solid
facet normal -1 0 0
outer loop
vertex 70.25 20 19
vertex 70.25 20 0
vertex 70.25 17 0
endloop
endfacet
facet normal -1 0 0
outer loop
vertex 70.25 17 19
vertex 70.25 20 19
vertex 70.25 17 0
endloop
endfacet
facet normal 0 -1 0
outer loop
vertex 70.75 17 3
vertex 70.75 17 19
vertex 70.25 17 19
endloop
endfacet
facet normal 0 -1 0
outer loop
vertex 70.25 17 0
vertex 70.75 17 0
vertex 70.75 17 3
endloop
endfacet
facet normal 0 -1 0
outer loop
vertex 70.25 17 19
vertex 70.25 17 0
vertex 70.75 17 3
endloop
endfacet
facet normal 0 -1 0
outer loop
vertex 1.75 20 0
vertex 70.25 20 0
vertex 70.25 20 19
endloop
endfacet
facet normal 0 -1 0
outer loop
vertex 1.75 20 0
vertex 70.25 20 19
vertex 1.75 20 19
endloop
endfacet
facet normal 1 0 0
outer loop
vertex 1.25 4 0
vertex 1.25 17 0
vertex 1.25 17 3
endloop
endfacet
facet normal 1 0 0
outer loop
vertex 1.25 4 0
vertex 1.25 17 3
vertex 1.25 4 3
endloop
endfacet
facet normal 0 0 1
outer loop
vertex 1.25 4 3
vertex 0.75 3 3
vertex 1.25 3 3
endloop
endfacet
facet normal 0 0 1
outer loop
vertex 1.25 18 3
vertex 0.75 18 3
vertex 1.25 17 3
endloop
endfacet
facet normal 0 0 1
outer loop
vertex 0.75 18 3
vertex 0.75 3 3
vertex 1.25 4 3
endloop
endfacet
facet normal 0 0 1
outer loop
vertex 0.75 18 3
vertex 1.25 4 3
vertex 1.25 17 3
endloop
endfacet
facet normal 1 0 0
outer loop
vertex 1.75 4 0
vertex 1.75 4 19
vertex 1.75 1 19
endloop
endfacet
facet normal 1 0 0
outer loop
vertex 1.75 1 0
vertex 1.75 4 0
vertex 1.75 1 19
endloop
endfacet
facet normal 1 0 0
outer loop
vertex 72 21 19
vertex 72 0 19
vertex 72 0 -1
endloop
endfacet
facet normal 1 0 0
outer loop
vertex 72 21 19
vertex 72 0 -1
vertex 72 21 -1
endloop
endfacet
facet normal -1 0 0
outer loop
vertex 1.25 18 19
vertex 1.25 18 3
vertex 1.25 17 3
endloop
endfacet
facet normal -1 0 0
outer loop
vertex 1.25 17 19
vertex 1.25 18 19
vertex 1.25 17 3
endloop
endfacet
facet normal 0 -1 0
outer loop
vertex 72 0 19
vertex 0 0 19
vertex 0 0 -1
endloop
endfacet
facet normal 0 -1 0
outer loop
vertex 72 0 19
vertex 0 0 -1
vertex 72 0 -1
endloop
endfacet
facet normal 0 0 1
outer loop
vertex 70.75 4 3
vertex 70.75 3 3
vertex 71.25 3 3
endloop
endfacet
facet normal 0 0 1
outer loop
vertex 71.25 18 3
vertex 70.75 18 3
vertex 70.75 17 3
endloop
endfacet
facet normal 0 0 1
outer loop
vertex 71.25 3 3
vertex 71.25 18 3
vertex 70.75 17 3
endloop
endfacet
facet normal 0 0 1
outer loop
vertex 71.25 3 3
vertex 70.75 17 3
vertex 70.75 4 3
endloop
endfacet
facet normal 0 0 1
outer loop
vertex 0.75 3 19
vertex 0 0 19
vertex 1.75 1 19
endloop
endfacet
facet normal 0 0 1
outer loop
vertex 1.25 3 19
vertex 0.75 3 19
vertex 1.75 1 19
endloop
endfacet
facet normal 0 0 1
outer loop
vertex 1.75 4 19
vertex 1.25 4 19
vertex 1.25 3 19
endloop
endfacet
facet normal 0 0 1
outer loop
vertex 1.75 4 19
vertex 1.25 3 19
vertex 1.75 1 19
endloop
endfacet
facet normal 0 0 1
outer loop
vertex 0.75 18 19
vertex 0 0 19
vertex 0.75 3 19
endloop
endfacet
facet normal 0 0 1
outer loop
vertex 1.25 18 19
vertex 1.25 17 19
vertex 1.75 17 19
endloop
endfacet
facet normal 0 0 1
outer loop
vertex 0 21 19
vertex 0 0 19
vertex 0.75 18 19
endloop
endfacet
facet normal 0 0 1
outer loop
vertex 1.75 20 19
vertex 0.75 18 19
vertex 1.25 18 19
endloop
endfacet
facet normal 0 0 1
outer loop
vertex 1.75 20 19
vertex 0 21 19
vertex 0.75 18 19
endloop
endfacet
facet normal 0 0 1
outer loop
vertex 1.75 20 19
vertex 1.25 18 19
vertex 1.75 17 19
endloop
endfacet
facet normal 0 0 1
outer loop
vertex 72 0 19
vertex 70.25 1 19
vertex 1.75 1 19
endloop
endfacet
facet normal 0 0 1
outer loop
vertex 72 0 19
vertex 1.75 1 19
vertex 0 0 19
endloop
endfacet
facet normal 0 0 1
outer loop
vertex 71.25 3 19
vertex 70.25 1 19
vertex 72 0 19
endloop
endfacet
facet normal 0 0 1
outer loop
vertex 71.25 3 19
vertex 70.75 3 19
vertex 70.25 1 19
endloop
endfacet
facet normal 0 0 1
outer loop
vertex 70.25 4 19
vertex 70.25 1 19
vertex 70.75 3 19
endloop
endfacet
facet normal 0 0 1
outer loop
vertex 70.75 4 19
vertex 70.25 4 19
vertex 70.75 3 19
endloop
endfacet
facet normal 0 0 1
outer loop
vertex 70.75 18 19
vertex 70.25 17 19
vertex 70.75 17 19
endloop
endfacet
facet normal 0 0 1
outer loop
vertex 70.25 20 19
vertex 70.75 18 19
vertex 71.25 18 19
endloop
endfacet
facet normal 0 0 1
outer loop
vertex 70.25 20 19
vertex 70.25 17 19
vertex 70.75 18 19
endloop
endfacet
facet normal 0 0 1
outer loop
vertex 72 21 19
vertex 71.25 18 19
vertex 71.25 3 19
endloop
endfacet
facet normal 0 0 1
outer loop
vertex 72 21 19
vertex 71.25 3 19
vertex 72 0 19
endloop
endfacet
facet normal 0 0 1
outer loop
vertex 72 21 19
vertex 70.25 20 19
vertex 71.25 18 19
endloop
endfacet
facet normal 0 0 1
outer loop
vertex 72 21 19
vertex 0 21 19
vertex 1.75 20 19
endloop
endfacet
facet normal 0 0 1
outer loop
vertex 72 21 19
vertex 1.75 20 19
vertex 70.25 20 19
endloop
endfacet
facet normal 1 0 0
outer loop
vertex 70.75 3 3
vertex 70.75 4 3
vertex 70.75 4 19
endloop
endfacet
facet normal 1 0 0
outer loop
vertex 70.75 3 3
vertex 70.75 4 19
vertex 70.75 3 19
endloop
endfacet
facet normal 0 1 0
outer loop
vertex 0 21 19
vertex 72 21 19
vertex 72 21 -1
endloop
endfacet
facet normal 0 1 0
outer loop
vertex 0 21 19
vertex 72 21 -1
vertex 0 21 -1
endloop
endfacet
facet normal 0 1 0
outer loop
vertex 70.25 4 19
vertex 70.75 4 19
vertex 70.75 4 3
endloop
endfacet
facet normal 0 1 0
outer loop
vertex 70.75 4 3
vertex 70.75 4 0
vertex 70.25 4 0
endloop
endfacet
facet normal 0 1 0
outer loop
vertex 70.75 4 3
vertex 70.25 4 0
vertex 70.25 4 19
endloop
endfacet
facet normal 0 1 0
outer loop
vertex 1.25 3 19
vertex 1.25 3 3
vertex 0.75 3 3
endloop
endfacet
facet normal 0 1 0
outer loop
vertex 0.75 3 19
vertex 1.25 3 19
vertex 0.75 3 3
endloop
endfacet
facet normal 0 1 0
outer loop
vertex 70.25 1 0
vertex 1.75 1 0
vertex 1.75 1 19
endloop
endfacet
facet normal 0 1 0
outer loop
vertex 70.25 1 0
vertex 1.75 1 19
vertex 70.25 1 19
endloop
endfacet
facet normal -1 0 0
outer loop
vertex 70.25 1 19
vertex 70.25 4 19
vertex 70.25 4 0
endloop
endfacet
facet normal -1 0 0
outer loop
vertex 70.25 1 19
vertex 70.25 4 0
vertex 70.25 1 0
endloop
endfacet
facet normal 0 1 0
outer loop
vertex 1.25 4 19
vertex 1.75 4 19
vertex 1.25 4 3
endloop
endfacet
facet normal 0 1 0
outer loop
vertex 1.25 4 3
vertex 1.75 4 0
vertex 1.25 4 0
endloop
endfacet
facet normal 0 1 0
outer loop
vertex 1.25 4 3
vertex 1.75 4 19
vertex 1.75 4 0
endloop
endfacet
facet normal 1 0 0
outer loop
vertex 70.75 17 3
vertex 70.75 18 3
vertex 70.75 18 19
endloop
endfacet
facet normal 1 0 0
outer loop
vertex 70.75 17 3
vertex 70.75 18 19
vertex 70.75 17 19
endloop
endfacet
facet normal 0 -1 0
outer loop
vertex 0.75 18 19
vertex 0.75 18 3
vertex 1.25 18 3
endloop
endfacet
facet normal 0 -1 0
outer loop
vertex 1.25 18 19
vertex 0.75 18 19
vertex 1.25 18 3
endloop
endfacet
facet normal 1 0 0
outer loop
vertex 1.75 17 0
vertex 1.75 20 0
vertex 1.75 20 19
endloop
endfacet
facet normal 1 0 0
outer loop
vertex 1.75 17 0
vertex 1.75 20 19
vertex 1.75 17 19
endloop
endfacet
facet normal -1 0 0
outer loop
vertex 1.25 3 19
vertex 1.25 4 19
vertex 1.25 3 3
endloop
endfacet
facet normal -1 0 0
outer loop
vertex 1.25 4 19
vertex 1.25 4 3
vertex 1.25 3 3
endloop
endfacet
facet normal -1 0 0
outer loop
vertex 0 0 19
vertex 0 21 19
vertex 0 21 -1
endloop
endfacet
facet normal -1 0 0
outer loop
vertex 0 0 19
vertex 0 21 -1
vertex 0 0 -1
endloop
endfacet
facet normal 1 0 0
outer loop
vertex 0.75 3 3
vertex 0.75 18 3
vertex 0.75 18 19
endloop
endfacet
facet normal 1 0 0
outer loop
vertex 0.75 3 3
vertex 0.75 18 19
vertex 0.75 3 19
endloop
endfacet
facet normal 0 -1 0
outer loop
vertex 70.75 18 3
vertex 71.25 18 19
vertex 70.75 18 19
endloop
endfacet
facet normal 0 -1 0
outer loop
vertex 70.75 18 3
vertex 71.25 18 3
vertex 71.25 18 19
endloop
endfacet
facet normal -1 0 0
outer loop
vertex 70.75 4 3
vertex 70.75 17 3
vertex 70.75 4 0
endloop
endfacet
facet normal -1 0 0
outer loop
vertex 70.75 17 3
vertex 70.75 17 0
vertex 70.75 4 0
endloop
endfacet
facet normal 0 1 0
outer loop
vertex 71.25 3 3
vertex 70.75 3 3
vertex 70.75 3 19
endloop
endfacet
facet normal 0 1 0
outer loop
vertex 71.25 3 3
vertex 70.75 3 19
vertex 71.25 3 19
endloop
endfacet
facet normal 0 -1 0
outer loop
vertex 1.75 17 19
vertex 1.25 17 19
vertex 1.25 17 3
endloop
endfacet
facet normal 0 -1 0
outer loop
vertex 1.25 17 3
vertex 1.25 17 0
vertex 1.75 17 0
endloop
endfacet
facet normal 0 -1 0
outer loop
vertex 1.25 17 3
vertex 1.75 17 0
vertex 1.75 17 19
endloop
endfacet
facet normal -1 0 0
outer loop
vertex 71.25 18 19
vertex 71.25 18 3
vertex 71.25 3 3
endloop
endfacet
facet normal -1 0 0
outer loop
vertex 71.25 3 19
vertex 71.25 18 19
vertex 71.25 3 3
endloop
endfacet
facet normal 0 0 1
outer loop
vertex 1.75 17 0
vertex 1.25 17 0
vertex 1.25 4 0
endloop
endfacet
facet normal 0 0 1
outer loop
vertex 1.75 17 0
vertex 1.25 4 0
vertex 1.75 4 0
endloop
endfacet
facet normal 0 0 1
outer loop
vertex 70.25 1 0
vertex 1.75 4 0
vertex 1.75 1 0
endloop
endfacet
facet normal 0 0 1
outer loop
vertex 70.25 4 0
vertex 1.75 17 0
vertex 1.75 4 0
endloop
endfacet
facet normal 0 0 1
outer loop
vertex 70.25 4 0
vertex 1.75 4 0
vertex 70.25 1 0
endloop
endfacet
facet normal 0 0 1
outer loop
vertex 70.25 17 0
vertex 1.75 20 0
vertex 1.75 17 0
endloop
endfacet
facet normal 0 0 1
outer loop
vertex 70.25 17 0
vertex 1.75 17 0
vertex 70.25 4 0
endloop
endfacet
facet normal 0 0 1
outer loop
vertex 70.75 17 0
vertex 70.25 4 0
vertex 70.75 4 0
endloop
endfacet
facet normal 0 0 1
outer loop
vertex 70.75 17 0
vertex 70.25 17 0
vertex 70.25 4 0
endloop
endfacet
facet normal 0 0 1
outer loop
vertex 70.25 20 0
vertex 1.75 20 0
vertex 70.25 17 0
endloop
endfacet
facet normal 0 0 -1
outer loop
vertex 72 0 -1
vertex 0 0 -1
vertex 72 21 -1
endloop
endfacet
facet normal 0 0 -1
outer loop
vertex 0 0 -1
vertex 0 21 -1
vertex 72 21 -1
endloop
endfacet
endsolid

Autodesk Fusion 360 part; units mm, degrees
sketch "Sketch1" plane through (0, 0, 0) normal (0, 0, 1) x (1, 0, 0)
  line L0 (0, 0) -> (72, 0)
  line L1 (72, 0) -> (72, 21)
  line L2 (72, 21) -> (0, 21)
  line L3 (0, 21) -> (0, 0)
  line L4 (4.75, 20) -> (69.75, 20)
  line L5 (69.75, 20) -> (69.75, 1)
  line L6 (69.75, 1) -> (4.75, 1)
  line L7 (4.75, 1) -> (4.75, 20)
  line L8 (69.75, 20) -> (71.25, 20)
  line L9 (71.25, 20) -> (71.25, 1)
  line L10 (71.25, 1) -> (69.75, 1)
  line L11 (69.75, 1) -> (69.75, 20)
  line L12 (4.75, 20) -> (0.75, 20)
  line L13 (0.75, 20) -> (0.75, 1)
  line L14 (0.75, 1) -> (4.75, 1)
  line L15 (4.75, 1) -> (4.75, 20)
  line L16 (0.75, 18) -> (1.25, 18)
  line L17 (1.25, 18) -> (1.25, 3)
  line L18 (1.25, 3) -> (0.75, 3)
  line L19 (0.75, 3) -> (0.75, 18)
  line L20 (1.25, 14.5) -> (4.75, 14.5)
  line L21 (4.75, 14.5) -> (4.75, 6.5)
  line L22 (4.75, 6.5) -> (1.25, 6.5)
  line L23 (1.25, 6.5) -> (1.25, 14.5)
  line L24 (0.75, 20) -> (1.75, 20)
  line L25 (1.75, 20) -> (1.75, 18)
  line L26 (1.75, 18) -> (0.75, 18)
  line L27 (0.75, 18) -> (0.75, 20)
  line L28 (1.75, 18) -> (1.25, 18)
  line L29 (1.25, 18) -> (1.25, 17)
  line L30 (1.25, 17) -> (1.75, 17)
  line L31 (1.75, 17) -> (1.75, 18)
  line L32 (0.75, 3) -> (1.75, 3)
  line L33 (1.75, 3) -> (1.75, 1)
  line L34 (1.75, 1) -> (0.75, 1)
  line L35 (0.75, 1) -> (0.75, 3)
  line L36 (1.25, 3) -> (1.75, 3)
  line L37 (1.75, 3) -> (1.75, 4)
  line L38 (1.75, 4) -> (1.25, 4)
  line L39 (1.25, 4) -> (1.25, 3)
  line L40 (71.25, 18) -> (70.75, 18)
  line L41 (70.75, 18) -> (70.75, 3)
  line L42 (70.75, 3) -> (71.25, 3)
  line L43 (71.25, 3) -> (71.25, 18)
  line L44 (70.75, 14.5) -> (69.75, 14.5)
  line L45 (69.75, 14.5) -> (69.75, 6.5)
  line L46 (69.75, 6.5) -> (70.75, 6.5)
  line L47 (70.75, 6.5) -> (70.75, 14.5)
  line L48 (71.25, 20) -> (70.25, 20)
  line L49 (70.25, 20) -> (70.25, 18)
  line L50 (70.25, 18) -> (71.25, 18)
  line L51 (71.25, 18) -> (71.25, 20)
  line L52 (70.25, 18) -> (70.75, 18)
  line L53 (70.75, 18) -> (70.75, 17)
  line L54 (70.75, 17) -> (70.25, 17)
  line L55 (70.25, 17) -> (70.25, 18)
  line L56 (71.25, 3) -> (70.25, 3)
  line L57 (70.25, 3) -> (70.25, 1)
  line L58 (70.25, 1) -> (71.25, 1)
  line L59 (71.25, 1) -> (71.25, 3)
  line L60 (70.25, 3) -> (70.75, 3)
  line L61 (70.75, 3) -> (70.75, 4)
  line L62 (70.75, 4) -> (70.25, 4)
  line L63 (70.25, 4) -> (70.25, 3)
  dimension "d46" = 72
  dimension "d47" = 21
  dimension "d48" = 65
  dimension "d49" = 19
  dimension "d50" = 1
  dimension "d51" = 1.5
  dimension "d52" = 19
  dimension "d53" = 4
  dimension "d54" = 19
  dimension "d55" = 0.75
  dimension "d56" = 0.5
  dimension "d57" = 15
  dimension "d58" = 2
  dimension "d59" = 8
  dimension "d60" = 3.5
  dimension "d61" = 3.5
  dimension "d62" = 1
  dimension "d63" = 2
  dimension "d64" = 0.5
  dimension "d65" = 1
  dimension "d66" = 1
  dimension "d67" = 2
  dimension "d68" = 0.5
  dimension "d69" = 1
  dimension "d70" = 0.5
  dimension "d71" = 15
  dimension "d72" = 2
  dimension "d73" = 1
  dimension "d74" = 8
  dimension "d75" = 3.5
  dimension "d76" = 1
  dimension "d77" = 2
  dimension "d78" = 0.5
  dimension "d79" = 1
  dimension "d80" = 1
  dimension "d81" = 2
  dimension "d82" = 0.5
  dimension "d83" = 1
extrude "Extrude3" add sketch "Sketch1" against normal blind 1 contours L0 L1 L2 L3 | L4 L5 L6 L7 L11 L15 L21 L45 | L7 L12 L15 L17 L20 L25 L30 L31 | L5 L8 L11 L41 L44 L49 L54 L55 | L7 L15 L17 L20 L21 L22 L23 | L12 L13 L16 L24 L25 L26 L27 L28 | L5 L11 L41 L44 L45 L46 L47 | L8 L9 L40 L48 L49 L50 L51 L52 | L7 L14 L15 L17 L22 L33 L37 L38 | L13 L16 L17 L18 L19 L23 L26 L29 L32 L39 | L17 L26 L28 L29 L30 L31 | L5 L10 L11 L41 L46 L57 L62 L63 | L9 L40 L41 L42 L43 L47 L50 L53 L56 L61 | L41 L50 L52 L53 L54 L55 | L13 L14 L18 L32 L33 L34 L35 L36 | L17 L32 L36 L37 L38 L39 | L9 L10 L42 L56 L57 L58 L59 L60 | L41 L56 L60 L61 L62 L63
extrude "Extrude4" add sketch "Sketch1" along normal blind 19 contours L0 L1 L2 L3 | L12 L13 L16 L24 L25 L26 L27 L28 | L8 L9 L40 L48 L49 L50 L51 L52 | L17 L26 L28 L29 L30 L31 | L41 L50 L52 L53 L54 L55 | L13 L14 L18 L32 L33 L34 L35 L36 | L17 L32 L36 L37 L38 L39 | L9 L10 L42 L56 L57 L58 L59 L60 | L41 L56 L60 L61 L62 L63
extrude "Extrude5" add sketch "Sketch1" along normal blind 3 contours L13 L16 L17 L18 L19 L23 L26 L29 L32 L39 | L9 L40 L41 L42 L43 L47 L50 L53 L56 L61
